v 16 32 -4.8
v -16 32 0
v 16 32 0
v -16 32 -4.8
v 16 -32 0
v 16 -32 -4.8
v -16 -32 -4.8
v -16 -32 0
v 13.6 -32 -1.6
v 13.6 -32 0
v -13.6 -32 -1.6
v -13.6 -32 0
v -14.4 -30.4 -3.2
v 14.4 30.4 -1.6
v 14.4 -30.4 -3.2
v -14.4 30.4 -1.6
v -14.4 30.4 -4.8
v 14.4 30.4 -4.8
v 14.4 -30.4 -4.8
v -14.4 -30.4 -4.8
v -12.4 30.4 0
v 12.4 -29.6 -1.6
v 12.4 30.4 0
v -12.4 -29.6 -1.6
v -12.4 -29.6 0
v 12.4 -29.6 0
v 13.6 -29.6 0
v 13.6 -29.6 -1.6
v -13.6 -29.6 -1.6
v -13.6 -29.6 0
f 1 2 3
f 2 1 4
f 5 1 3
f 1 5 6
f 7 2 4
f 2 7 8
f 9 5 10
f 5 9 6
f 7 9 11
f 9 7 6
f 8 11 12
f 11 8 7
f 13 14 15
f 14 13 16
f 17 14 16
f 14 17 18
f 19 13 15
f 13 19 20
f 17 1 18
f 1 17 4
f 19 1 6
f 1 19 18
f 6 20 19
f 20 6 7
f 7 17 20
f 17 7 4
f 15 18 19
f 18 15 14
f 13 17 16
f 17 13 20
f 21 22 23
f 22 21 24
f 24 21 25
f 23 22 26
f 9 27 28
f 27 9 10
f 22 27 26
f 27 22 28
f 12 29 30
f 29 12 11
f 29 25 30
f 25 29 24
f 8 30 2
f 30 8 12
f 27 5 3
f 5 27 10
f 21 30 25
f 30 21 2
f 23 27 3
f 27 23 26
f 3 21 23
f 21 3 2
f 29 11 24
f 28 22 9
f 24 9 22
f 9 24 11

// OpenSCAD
// file: ../p/rect3.scad
use <../lib.scad>
function ldraw_lib__rect3() = [
// 0 Rectangle with 3 Edges
// 0 Name: rect3.dat
// 0 Author: Mark Kennedy [mkennedy]
// 0 !LDRAW_ORG Primitive UPDATE 2010-01
// 0 !LICENSE Licensed under CC BY 2.0 and CC BY 4.0 : see CAreadme.txt
// 
// 0 BFC CERTIFY CCW
  [0,"BFC","CERTIFY"],
  [0,"BFC","CCW"],
// 
// 0 !HISTORY 2003-08-01 [PTadmin] Official Update 2003-02
// 0 !HISTORY 2007-06-24 [PTadmin] Header formatted for Contributor Agreement
// 0 !HISTORY 2008-07-01 [PTadmin] Official Update 2008-01
// 0 !HISTORY 2010-01-17 [mikeheide] Change winding to CCW
// 0 !HISTORY 2010-04-05 [PTadmin] Official Update 2010-01
// 
// 
// 2 24 1 0 1 -1 0 1
  [2,24,1,0,1,-1,0,1],
// 2 24 1 0 1 1 0 -1
  [2,24,1,0,1,1,0,-1],
// 2 24 -1 0 1 -1 0 -1
  [2,24,-1,0,1,-1,0,-1],
// 4 16 -1 0 1 -1 0 -1 1 0 -1 1 0 1
  [4,16,-1,0,1,-1,0,-1,1,0,-1,1,0,1],
// 0 //
];
module ldraw_lib__rect3(step=0, col=false, unit=2/5, alt=false, line=0.2, solid=!$preview)
    makepoly(ldraw_lib__rect3(), step=step, col=col, unit=unit, alt=alt, line=line, solid=solid);
ldraw_lib__rect3(line=0.2);
// file: ../p/rect2p.scad
use <../lib.scad>
function ldraw_lib__rect2p() = [
// 0 Rectangle with 2 Parallel Edges
// 0 Name: rect2p.dat
// 0 Author: Donald Sutter [technog]
// 0 !LDRAW_ORG Primitive UPDATE 2010-01
// 0 !LICENSE Licensed under CC BY 2.0 and CC BY 4.0 : see CAreadme.txt
// 
// 0 BFC CERTIFY CCW
  [0,"BFC","CERTIFY"],
  [0,"BFC","CCW"],
// 
// 0 !HISTORY 2003-08-01 [PTadmin] Official Update 2003-02
// 0 !HISTORY 2007-06-24 [PTadmin] Header formatted for Contributor Agreement
// 0 !HISTORY 2008-07-01 [PTadmin] Official Update 2008-01
// 0 !HISTORY 2010-01-17 [mikeheide] changed winding to CCW
// 0 !HISTORY 2010-04-05 [PTadmin] Official Update 2010-01
// 
// 
// 2 24 1 0 1 -1 0 1
  [2,24,1,0,1,-1,0,1],
// 2 24 -1 0 -1 1 0 -1
  [2,24,-1,0,-1,1,0,-1],
// 4 16 -1 0 1 -1 0 -1 1 0 -1 1 0 1
  [4,16,-1,0,1,-1,0,-1,1,0,-1,1,0,1],
// 0
];
module ldraw_lib__rect2p(step=0, col=false, unit=2/5, alt=false, line=0.2, solid=!$preview)
    makepoly(ldraw_lib__rect2p(), step=step, col=col, unit=unit, alt=alt, line=line, solid=solid);
ldraw_lib__rect2p(line=0.2);
// file: ../p/box3u2p.scad
use <../lib.scad>
function ldraw_lib__box3u2p() = [
// 0 Box with 3 Faces without 2 Parallel Edges
// 0 Name: box3u2p.dat
// 0 Author: Niels Karsdorp [nielsk]
// 0 !LDRAW_ORG Primitive UPDATE 2012-01
// 0 !LICENSE Licensed under CC BY 2.0 and CC BY 4.0 : see CAreadme.txt
// 
// 0 BFC CERTIFY CCW
  [0,"BFC","CERTIFY"],
  [0,"BFC","CCW"],
// 
// 0 !HISTORY 2003-03-12 [PTadmin] Official Update 2003-01
// 0 !HISTORY 2007-06-24 [PTadmin] Header formatted for Contributor Agreement
// 0 !HISTORY 2008-07-01 [PTadmin] Official Update 2008-01
// 0 !HISTORY 2012-02-16 [Philo] Changed to CCW
// 0 !HISTORY 2012-03-30 [PTadmin] Official Update 2012-01
// 
// 
// 2 24 1 1 1 -1 1 1
  [2,24,1,1,1,-1,1,1],
// 2 24 -1 1 -1 1 1 -1
  [2,24,-1,1,-1,1,1,-1],
// 2 24 1 0 1 -1 0 1
  [2,24,1,0,1,-1,0,1],
// 2 24 -1 0 -1 1 0 -1
  [2,24,-1,0,-1,1,0,-1],
// 2 24 1 1 1 1 1 -1
  [2,24,1,1,1,1,1,-1],
// 2 24 -1 1 1 -1 1 -1
  [2,24,-1,1,1,-1,1,-1],
// 2 24 1 1 1 1 0 1
  [2,24,1,1,1,1,0,1],
// 2 24 1 1 -1 1 0 -1
  [2,24,1,1,-1,1,0,-1],
// 2 24 -1 1 1 -1 0 1
  [2,24,-1,1,1,-1,0,1],
// 2 24 -1 1 -1 -1 0 -1
  [2,24,-1,1,-1,-1,0,-1],
// 4 16 -1 1 -1 -1 1 1 1 1 1 1 1 -1
  [4,16,-1,1,-1,-1,1,1,1,1,1,1,1,-1],
// 4 16 -1 1 1 -1 0 1 1 0 1 1 1 1
  [4,16,-1,1,1,-1,0,1,1,0,1,1,1,1],
// 4 16 1 1 -1 1 0 -1 -1 0 -1 -1 1 -1
  [4,16,1,1,-1,1,0,-1,-1,0,-1,-1,1,-1],
];
module ldraw_lib__box3u2p(step=0, col=false, unit=2/5, alt=false, line=0.2, solid=!$preview)
    makepoly(ldraw_lib__box3u2p(), step=step, col=col, unit=unit, alt=alt, line=line, solid=solid);
ldraw_lib__box3u2p(line=0.2);
// file: ../p/box2-5.scad
use <../lib.scad>
function ldraw_lib__box2_5() = [
// 0 Box with 2 Faces without 5 Edges
// 0 Name: box2-5.dat
// 0 Author: Steffen [Steffen]
// 0 !LDRAW_ORG Primitive UPDATE 2003-03
// 0 !LICENSE Licensed under CC BY 2.0 and CC BY 4.0 : see CAreadme.txt
// 
// 0 BFC CERTIFY CCW
  [0,"BFC","CERTIFY"],
  [0,"BFC","CCW"],
// 
// 0 !HISTORY 2003-12-19 [PTadmin] Official Update 2003-03
// 0 !HISTORY 2007-06-24 [PTadmin] Header formatted for Contributor Agreement
// 0 !HISTORY 2008-07-01 [PTadmin] Official Update 2008-01
// 
// 
// 2 24 1 1 1 -1 1 1
  [2,24,1,1,1,-1,1,1],
// 2 24 1 1 -1 -1 1 -1
  [2,24,1,1,-1,-1,1,-1],
// 2 24 1 -1 1 -1 -1 1
  [2,24,1,-1,1,-1,-1,1],
// 2 24 -1 -1 1 -1 1 1
  [2,24,-1,-1,1,-1,1,1],
// 2 24 1 -1 1 1 1 1
  [2,24,1,-1,1,1,1,1],
// 2 24 -1 1 -1 -1 1 1
  [2,24,-1,1,-1,-1,1,1],
// 2 24 1 1 -1 1 1 1
  [2,24,1,1,-1,1,1,1],
// 4 16 1 1 1 1 1 -1 -1 1 -1 -1 1 1
  [4,16,1,1,1,1,1,-1,-1,1,-1,-1,1,1],
// 4 16 1 1 1 -1 1 1 -1 -1 1 1 -1 1
  [4,16,1,1,1,-1,1,1,-1,-1,1,1,-1,1],
// 0
];
module ldraw_lib__box2_5(step=0, col=false, unit=2/5, alt=false, line=0.2, solid=!$preview)
    makepoly(ldraw_lib__box2_5(), step=step, col=col, unit=unit, alt=alt, line=line, solid=solid);
ldraw_lib__box2_5(line=0.2);
// main file
use <../lib.scad>
use <../p/box2-5.scad>
use <../p/box3u2p.scad>
use <../p/rect2p.scad>
use <../p/rect3.scad>
function ldraw_lib__u9340() = [
// 0 ~Garage  4 x  8 x  3 Base
// 0 Name: u9340.dat
// 0 Author: Magnus Forsberg [MagFors]
// 0 !LDRAW_ORG Part UPDATE 2016-01
// 0 !LICENSE Licensed under CC BY 2.0 and CC BY 4.0 : see CAreadme.txt
// 
// 0 BFC CERTIFY CCW
  [0,"BFC","CERTIFY"],
  [0,"BFC","CCW"],
// 
// 0 !HISTORY 2016-12-31 [PTadmin] Official Update 2016-01
// 
// 
// 1 16 0 6 -80 0 0 40 -6 0 0 0 160 0 box3u2p.dat
  [1,16,0,6,-80,0,0,40,-6,0,0,0,160,0, ldraw_lib__box3u2p()],
// 2 24 40 12 -80 -40 12 -80
  [2,24,40,12,-80,-40,12,-80],
// 2 24 40 0 -80 34 0 -80
  [2,24,40,0,-80,34,0,-80],
// 2 24 34 4 -80 -34 4 -80
  [2,24,34,4,-80,-34,4,-80],
// 2 24 -34 0 -80 -40 0 -80
  [2,24,-34,0,-80,-40,0,-80],
// 4 16 40 0 -80 34 0 -80 34 4 -80 40 12 -80
  [4,16,40,0,-80,34,0,-80,34,4,-80,40,12,-80],
// 4 16 40 12 -80 34 4 -80 -34 4 -80 -40 12 -80
  [4,16,40,12,-80,34,4,-80,-34,4,-80,-40,12,-80],
// 4 16 -40 12 -80 -34 4 -80 -34 0 -80 -40 0 -80
  [4,16,-40,12,-80,-34,4,-80,-34,0,-80,-40,0,-80],
// 0 BFC INVERTNEXT
  [0,"BFC","INVERTNEXT"],
// 1 16 0 10 0 -36 0 0 0 -4 -2 0 0 76 box2-5.dat
  [1,16,0,10,0,-36,0,0,0,-4,-2,0,0,76, ldraw_lib__box2_5()],
// 1 16 0 10 -76 36 0 0 0 0 2 0 -1 0 rect3.dat
  [1,16,0,10,-76,36,0,0,0,0,2,0,-1,0, ldraw_lib__rect3()],
// 2 24 36 12 76 36 12 -76
  [2,24,36,12,76,36,12,-76],
// 2 24 -36 12 -76 -36 12 76
  [2,24,-36,12,-76,-36,12,76],
// 4 16 36 12 76 -36 12 76 -40 12 80 40 12 80
  [4,16,36,12,76,-36,12,76,-40,12,80,40,12,80],
// 4 16 36 12 -76 36 12 76 40 12 80 40 12 -80
  [4,16,36,12,-76,36,12,76,40,12,80,40,12,-80],
// 4 16 -36 12 -76 36 12 -76 40 12 -80 -40 12 -80
  [4,16,-36,12,-76,36,12,-76,40,12,-80,-40,12,-80],
// 4 16 -36 12 76 -36 12 -76 -40 12 -80 -40 12 80
  [4,16,-36,12,76,-36,12,-76,-40,12,-80,-40,12,80],
// 4 16 36 8 -76 36 4 76 36 12 76 36 12 -76
  [4,16,36,8,-76,36,4,76,36,12,76,36,12,-76],
// 4 16 -36 4 76 -36 8 -76 -36 12 -76 -36 12 76
  [4,16,-36,4,76,-36,8,-76,-36,12,-76,-36,12,76],
// 1 16 0 2 1 0 0 31 2 1 0 -75 0 0 rect2p.dat
  [1,16,0,2,1,0,0,31,2,1,0,-75,0,0, ldraw_lib__rect2p()],
// 2 24 31 0 76 31 0 -74
  [2,24,31,0,76,31,0,-74],
// 2 24 -31 0 76 -31 0 -74
  [2,24,-31,0,76,-31,0,-74],
// 3 16 -31 4 -74 -31 0 76 -31 0 -74
  [3,16,-31,4,-74,-31,0,76,-31,0,-74],
// 3 16 31 0 76 31 4 -74 31 0 -74
  [3,16,31,0,76,31,4,-74,31,0,-74],
// 0 BFC INVERTNEXT
  [0,"BFC","INVERTNEXT"],
// 1 16 32.5 2 -77 0 1.5 0 -2 0 0 0 0 3 box2-5.dat
  [1,16,32.5,2,-77,0,1.5,0,-2,0,0,0,0,3, ldraw_lib__box2_5()],
// 0 BFC INVERTNEXT
  [0,"BFC","INVERTNEXT"],
// 1 16 -32.5 2 -77 0 -1.5 0 -2 0 0 0 0 3 box2-5.dat
  [1,16,-32.5,2,-77,0,-1.5,0,-2,0,0,0,0,3, ldraw_lib__box2_5()],
// 4 16 -40 0 80 -40 0 -80 -34 0 -80 -34 0 -74
  [4,16,-40,0,80,-40,0,-80,-34,0,-80,-34,0,-74],
// 4 16 34 0 -80 40 0 -80 40 0 80 34 0 -74
  [4,16,34,0,-80,40,0,-80,40,0,80,34,0,-74],
// 4 16 -40 0 80 -34 0 -74 -31 0 -74 -31 0 76
  [4,16,-40,0,80,-34,0,-74,-31,0,-74,-31,0,76],
// 4 16 31 0 -74 34 0 -74 40 0 80 31 0 76
  [4,16,31,0,-74,34,0,-74,40,0,80,31,0,76],
// 4 16 -40 0 80 -31 0 76 31 0 76 40 0 80
  [4,16,-40,0,80,-31,0,76,31,0,76,40,0,80],
// 3 16 -34 4 -74 -34 4 -80 -31 4 -74
  [3,16,-34,4,-74,-34,4,-80,-31,4,-74],
// 3 16 34 4 -74 31 4 -74 34 4 -80
  [3,16,34,4,-74,31,4,-74,34,4,-80],
// 4 16 31 4 -74 -31 4 -74 -34 4 -80 34 4 -80
  [4,16,31,4,-74,-31,4,-74,-34,4,-80,34,4,-80],
// 5 24 -31 4 -74 31 4 -74 34 4 -80 31 0 76
  [5,24,-31,4,-74,31,4,-74,34,4,-80,31,0,76],
// 5 24 -31 0 76 31 0 76 40 0 80 31 4 -74
  [5,24,-31,0,76,31,0,76,40,0,80,31,4,-74],
];
module ldraw_lib__u9340(step=0, col=false, unit=2/5, alt=false, line=0.2, solid=!$preview)
    makepoly(ldraw_lib__u9340(), step=step, col=col, unit=unit, alt=alt, line=line, solid=solid);
ldraw_lib__u9340(line=0.2);
